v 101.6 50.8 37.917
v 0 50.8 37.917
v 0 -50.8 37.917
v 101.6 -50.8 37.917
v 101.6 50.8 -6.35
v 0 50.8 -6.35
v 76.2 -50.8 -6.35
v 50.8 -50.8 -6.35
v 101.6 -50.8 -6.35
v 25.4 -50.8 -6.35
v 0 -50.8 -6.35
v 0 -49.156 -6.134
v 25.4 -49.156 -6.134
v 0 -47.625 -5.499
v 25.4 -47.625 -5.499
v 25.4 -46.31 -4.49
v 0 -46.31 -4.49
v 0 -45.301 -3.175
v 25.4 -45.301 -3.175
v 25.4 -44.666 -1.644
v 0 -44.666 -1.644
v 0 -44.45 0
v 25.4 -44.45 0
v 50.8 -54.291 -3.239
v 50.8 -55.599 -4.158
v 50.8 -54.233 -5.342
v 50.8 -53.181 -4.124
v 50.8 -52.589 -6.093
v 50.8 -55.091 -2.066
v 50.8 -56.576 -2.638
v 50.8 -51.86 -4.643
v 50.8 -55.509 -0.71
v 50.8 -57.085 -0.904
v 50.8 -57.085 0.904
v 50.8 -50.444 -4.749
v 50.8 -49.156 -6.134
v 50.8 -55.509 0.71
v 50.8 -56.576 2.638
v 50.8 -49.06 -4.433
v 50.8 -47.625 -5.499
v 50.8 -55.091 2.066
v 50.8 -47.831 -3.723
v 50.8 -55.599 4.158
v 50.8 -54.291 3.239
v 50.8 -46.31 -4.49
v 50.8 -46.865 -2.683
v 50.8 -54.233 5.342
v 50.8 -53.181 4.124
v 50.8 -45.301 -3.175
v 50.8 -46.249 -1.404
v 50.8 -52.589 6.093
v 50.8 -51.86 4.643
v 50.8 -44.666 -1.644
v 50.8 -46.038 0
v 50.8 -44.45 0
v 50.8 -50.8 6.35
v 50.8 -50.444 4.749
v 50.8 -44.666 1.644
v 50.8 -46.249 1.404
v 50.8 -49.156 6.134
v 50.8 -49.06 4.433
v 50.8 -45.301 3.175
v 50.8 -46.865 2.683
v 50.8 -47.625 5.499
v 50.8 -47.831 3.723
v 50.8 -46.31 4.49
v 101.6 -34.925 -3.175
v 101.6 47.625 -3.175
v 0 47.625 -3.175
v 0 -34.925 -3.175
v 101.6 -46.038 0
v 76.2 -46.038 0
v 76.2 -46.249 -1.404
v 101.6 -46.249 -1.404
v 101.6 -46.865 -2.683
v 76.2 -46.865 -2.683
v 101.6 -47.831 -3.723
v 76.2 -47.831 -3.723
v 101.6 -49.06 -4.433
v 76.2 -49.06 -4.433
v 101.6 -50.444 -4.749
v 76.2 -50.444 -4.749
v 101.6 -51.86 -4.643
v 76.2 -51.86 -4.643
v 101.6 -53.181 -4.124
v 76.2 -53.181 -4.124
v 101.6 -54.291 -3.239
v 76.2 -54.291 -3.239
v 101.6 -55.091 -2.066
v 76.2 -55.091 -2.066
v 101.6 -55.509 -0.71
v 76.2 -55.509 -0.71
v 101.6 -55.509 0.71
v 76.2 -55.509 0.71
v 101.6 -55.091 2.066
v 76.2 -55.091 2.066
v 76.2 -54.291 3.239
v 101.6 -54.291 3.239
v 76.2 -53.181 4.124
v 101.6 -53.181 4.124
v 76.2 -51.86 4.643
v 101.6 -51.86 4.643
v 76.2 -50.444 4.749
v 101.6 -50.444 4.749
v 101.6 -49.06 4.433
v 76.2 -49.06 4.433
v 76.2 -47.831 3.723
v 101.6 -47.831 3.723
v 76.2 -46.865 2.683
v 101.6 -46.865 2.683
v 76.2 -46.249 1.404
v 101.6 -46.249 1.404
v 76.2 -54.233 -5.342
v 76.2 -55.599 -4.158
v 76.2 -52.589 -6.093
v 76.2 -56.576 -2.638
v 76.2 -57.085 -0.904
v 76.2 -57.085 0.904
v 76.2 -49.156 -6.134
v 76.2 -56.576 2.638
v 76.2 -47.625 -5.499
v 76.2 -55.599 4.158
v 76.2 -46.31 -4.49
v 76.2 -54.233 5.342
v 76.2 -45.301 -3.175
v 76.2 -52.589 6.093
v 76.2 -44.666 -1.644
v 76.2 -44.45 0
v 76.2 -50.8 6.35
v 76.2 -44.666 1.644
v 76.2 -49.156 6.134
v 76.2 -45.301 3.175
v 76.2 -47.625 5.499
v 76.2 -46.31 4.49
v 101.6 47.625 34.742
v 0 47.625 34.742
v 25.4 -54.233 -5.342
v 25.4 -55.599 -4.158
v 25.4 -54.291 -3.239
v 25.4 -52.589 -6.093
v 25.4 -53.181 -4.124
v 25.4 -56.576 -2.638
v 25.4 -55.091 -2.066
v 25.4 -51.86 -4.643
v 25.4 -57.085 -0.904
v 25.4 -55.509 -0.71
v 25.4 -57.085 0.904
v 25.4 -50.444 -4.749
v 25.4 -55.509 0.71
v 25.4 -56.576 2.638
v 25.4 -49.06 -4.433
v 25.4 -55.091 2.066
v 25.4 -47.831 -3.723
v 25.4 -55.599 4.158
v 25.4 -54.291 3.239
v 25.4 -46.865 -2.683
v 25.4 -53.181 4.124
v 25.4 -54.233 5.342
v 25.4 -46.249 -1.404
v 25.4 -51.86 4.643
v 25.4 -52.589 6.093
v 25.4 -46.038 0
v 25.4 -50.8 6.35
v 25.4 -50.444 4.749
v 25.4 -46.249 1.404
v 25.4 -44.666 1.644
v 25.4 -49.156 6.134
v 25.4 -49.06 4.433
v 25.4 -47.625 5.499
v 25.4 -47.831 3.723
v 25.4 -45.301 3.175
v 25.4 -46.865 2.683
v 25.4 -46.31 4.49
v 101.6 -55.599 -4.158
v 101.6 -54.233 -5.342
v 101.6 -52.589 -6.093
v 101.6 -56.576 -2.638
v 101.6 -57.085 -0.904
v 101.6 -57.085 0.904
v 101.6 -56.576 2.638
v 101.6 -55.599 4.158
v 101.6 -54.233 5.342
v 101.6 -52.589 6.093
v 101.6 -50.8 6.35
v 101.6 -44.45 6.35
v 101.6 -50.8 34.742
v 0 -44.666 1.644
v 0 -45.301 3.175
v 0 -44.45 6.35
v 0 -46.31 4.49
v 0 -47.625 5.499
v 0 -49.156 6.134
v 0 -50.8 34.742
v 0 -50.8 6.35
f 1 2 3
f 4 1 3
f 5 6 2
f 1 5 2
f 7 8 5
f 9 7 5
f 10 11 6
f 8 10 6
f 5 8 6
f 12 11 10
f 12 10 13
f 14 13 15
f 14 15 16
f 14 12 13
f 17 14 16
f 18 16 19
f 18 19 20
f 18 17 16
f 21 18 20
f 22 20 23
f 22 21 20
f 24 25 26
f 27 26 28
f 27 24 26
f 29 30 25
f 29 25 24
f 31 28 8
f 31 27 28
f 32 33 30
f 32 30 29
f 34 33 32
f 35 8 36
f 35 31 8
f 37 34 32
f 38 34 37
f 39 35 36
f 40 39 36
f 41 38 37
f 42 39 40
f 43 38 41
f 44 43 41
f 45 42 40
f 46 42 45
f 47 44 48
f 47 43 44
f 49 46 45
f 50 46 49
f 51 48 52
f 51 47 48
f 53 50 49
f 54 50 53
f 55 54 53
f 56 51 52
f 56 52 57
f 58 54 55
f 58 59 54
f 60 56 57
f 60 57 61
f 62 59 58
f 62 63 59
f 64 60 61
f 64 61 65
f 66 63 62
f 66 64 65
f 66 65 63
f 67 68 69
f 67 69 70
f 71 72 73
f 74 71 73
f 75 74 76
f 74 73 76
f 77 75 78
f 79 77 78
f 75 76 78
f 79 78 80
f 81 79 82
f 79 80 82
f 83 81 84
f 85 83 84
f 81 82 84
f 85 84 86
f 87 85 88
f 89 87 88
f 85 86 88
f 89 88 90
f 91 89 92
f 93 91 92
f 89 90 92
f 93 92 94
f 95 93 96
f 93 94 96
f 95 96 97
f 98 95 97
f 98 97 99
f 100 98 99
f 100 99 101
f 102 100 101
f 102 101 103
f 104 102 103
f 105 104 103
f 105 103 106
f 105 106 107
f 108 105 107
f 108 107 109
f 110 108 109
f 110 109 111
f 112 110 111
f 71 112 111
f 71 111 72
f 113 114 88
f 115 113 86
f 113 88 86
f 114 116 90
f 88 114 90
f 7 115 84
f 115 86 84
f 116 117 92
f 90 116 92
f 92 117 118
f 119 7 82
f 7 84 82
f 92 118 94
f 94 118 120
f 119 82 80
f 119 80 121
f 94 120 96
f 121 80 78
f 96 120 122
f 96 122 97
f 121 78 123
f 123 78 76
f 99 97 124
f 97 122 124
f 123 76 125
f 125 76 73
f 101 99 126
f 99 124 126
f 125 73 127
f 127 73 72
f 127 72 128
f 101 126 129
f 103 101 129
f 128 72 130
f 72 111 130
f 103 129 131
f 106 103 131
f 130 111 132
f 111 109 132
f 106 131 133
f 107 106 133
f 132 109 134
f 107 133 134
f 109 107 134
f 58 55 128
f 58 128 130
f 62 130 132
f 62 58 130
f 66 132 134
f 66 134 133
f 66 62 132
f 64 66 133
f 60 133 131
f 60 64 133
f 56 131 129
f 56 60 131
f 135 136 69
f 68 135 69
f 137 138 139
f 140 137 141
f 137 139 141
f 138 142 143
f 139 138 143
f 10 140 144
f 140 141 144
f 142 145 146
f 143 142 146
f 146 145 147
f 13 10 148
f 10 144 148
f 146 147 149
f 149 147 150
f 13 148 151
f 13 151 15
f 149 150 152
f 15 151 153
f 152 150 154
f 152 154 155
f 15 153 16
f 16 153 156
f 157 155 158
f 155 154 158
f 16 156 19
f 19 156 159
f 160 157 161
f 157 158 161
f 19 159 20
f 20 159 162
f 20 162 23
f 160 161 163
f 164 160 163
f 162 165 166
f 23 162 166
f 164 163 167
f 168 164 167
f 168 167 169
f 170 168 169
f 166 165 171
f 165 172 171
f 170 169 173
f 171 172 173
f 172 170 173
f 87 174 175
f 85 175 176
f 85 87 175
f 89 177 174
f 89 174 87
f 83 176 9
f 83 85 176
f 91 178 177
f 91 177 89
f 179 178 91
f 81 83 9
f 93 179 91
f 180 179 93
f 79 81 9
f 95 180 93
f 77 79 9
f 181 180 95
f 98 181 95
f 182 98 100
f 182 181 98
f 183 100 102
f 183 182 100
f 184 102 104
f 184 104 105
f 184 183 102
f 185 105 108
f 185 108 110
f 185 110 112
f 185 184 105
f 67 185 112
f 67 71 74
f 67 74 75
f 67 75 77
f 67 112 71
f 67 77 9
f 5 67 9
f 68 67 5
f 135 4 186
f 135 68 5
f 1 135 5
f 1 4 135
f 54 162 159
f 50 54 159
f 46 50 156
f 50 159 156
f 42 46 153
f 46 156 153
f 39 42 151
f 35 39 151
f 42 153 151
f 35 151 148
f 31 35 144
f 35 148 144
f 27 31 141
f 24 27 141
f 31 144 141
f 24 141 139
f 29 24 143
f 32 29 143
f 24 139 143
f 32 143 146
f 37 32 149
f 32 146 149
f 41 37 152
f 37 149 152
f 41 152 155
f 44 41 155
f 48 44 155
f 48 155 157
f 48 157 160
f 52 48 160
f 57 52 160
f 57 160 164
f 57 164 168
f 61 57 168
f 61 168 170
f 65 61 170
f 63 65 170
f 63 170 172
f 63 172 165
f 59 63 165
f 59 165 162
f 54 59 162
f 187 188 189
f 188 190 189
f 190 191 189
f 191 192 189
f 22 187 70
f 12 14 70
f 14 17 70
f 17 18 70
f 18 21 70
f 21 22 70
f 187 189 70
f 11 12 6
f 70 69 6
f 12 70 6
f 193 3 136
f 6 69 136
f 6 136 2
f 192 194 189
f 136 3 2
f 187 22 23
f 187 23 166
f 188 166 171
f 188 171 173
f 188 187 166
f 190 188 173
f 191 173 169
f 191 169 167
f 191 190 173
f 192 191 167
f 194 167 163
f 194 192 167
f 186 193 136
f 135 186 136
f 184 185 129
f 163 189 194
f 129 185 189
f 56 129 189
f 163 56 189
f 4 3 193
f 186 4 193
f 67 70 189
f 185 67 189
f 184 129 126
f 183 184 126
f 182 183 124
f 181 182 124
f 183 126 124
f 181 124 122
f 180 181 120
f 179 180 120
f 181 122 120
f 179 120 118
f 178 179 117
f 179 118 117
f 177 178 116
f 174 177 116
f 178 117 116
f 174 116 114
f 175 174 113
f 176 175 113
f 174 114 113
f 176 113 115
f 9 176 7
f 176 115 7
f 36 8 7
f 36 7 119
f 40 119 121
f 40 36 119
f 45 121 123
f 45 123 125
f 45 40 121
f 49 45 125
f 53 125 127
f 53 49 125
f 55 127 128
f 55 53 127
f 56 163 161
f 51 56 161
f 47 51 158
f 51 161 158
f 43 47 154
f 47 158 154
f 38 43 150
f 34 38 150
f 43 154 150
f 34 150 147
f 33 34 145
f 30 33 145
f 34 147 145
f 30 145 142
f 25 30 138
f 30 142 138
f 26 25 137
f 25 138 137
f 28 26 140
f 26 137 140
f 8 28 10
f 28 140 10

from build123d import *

# Parameters (mm, degrees)
F1_DEPTH = 101.6
F2_DEPTH = 101.6
F3_DEPTH = 76.2
F4_DEPTH = 50.8
F5_DEPTH = 25.4


with BuildPart() as f1:
    # F0 (on Right) → F1 (new body)
    with BuildSketch(Plane.YZ):
        Polygon((-34.925, -3.175), (-44.45, 6.35), (-44.45, 0), (-44.45, -6.35), (50.8, -6.35), (50.8, 6.35), (50.8, 34.7416847944), (50.8, 37.9166847944), (47.625, 37.9166847944), (-50.8, 37.9166847944), (-50.8, 34.7416847944), (47.625, 34.7416847944), (47.625, 6.35), (47.625, -3.175), align=None)
        with BuildLine():
            Line((-44.45, -6.35), (-44.45, 0))
            ThreePointArc((-44.45, 0), (-46.3098719395, -4.4901280605), (-50.8, -6.35))
            Line((-50.8, -6.35), (-44.45, -6.35))
        make_face()
        with BuildLine():
            Line((-44.45, 0), (-44.45, 6.35))
            Line((-44.45, 6.35), (-50.8, 6.35))
            ThreePointArc((-50.8, 6.35), (-46.3098719395, 4.4901280605), (-44.45, 0))
        make_face()
    extrude(amount=F1_DEPTH)

    # F0 (on Right) → F2 (join)
    with BuildSketch(Plane.YZ):
        with BuildLine():
            ThreePointArc((-44.45, 0), (-46.3098719395, 4.4901280605), (-50.8, 6.35))
            Line((-50.8, 6.35), (-50.8, 4.7625))
            ThreePointArc((-50.8, 4.7625), (-47.4324039546, 3.3675960454), (-46.0375, 0))
            ThreePointArc((-46.0375, 0), (-47.4324039546, -3.3675960454), (-50.8, -4.7625))
            Line((-50.8, -4.7625), (-50.8, -6.35))
            ThreePointArc((-50.8, -6.35), (-46.3098719395, -4.4901280605), (-44.45, 0))
        make_face()
        with BuildLine():
            Line((-50.8, 4.7625), (-50.8, 6.35))
            ThreePointArc((-50.8, 6.35), (-57.15, 0), (-50.8, -6.35))
            Line((-50.8, -6.35), (-50.8, -4.7625))
            ThreePointArc((-50.8, -4.7625), (-55.5625, 0), (-50.8, 4.7625))
        make_face()
    extrude(amount=F2_DEPTH)

    # F0 (on Right) → F3 (cut)
    with BuildSketch(Plane.YZ):
        with BuildLine():
            Line((-50.8, 4.7625), (-50.8, 6.35))
            ThreePointArc((-50.8, 6.35), (-57.15, 0), (-50.8, -6.35))
            Line((-50.8, -6.35), (-50.8, -4.7625))
            ThreePointArc((-50.8, -4.7625), (-55.5625, 0), (-50.8, 4.7625))
        make_face()
        with BuildLine():
            ThreePointArc((-44.45, 0), (-46.3098719395, 4.4901280605), (-50.8, 6.35))
            Line((-50.8, 6.35), (-50.8, 4.7625))
            ThreePointArc((-50.8, 4.7625), (-47.4324039546, 3.3675960454), (-46.0375, 0))
            ThreePointArc((-46.0375, 0), (-47.4324039546, -3.3675960454), (-50.8, -4.7625))
            Line((-50.8, -4.7625), (-50.8, -6.35))
            ThreePointArc((-50.8, -6.35), (-46.3098719395, -4.4901280605), (-44.45, 0))
        make_face()
    extrude(amount=F3_DEPTH, mode=Mode.SUBTRACT)

    # F0 (on Right) → F4 (join)
    with BuildSketch(Plane.YZ):
        with BuildLine():
            Line((-50.8, 4.7625), (-50.8, 6.35))
            ThreePointArc((-50.8, 6.35), (-57.15, 0), (-50.8, -6.35))
            Line((-50.8, -6.35), (-50.8, -4.7625))
            ThreePointArc((-50.8, -4.7625), (-55.5625, 0), (-50.8, 4.7625))
        make_face()
        with BuildLine():
            ThreePointArc((-44.45, 0), (-46.3098719395, 4.4901280605), (-50.8, 6.35))
            Line((-50.8, 6.35), (-50.8, 4.7625))
            ThreePointArc((-50.8, 4.7625), (-47.4324039546, 3.3675960454), (-46.0375, 0))
            ThreePointArc((-46.0375, 0), (-47.4324039546, -3.3675960454), (-50.8, -4.7625))
            Line((-50.8, -4.7625), (-50.8, -6.35))
            ThreePointArc((-50.8, -6.35), (-46.3098719395, -4.4901280605), (-44.45, 0))
        make_face()
    extrude(amount=F4_DEPTH)

    # F0 (on Right) → F5 (cut)
    with BuildSketch(Plane.YZ):
        with BuildLine():
            ThreePointArc((-44.45, 0), (-46.3098719395, 4.4901280605), (-50.8, 6.35))
            Line((-50.8, 6.35), (-50.8, 4.7625))
            ThreePointArc((-50.8, 4.7625), (-47.4324039546, 3.3675960454), (-46.0375, 0))
            ThreePointArc((-46.0375, 0), (-47.4324039546, -3.3675960454), (-50.8, -4.7625))
            Line((-50.8, -4.7625), (-50.8, -6.35))
            ThreePointArc((-50.8, -6.35), (-46.3098719395, -4.4901280605), (-44.45, 0))
        make_face()
        with BuildLine():
            Line((-50.8, 4.7625), (-50.8, 6.35))
            ThreePointArc((-50.8, 6.35), (-57.15, 0), (-50.8, -6.35))
            Line((-50.8, -6.35), (-50.8, -4.7625))
            ThreePointArc((-50.8, -4.7625), (-55.5625, 0), (-50.8, 4.7625))
        make_face()
    extrude(amount=F5_DEPTH, mode=Mode.SUBTRACT)


solid = f1.part
